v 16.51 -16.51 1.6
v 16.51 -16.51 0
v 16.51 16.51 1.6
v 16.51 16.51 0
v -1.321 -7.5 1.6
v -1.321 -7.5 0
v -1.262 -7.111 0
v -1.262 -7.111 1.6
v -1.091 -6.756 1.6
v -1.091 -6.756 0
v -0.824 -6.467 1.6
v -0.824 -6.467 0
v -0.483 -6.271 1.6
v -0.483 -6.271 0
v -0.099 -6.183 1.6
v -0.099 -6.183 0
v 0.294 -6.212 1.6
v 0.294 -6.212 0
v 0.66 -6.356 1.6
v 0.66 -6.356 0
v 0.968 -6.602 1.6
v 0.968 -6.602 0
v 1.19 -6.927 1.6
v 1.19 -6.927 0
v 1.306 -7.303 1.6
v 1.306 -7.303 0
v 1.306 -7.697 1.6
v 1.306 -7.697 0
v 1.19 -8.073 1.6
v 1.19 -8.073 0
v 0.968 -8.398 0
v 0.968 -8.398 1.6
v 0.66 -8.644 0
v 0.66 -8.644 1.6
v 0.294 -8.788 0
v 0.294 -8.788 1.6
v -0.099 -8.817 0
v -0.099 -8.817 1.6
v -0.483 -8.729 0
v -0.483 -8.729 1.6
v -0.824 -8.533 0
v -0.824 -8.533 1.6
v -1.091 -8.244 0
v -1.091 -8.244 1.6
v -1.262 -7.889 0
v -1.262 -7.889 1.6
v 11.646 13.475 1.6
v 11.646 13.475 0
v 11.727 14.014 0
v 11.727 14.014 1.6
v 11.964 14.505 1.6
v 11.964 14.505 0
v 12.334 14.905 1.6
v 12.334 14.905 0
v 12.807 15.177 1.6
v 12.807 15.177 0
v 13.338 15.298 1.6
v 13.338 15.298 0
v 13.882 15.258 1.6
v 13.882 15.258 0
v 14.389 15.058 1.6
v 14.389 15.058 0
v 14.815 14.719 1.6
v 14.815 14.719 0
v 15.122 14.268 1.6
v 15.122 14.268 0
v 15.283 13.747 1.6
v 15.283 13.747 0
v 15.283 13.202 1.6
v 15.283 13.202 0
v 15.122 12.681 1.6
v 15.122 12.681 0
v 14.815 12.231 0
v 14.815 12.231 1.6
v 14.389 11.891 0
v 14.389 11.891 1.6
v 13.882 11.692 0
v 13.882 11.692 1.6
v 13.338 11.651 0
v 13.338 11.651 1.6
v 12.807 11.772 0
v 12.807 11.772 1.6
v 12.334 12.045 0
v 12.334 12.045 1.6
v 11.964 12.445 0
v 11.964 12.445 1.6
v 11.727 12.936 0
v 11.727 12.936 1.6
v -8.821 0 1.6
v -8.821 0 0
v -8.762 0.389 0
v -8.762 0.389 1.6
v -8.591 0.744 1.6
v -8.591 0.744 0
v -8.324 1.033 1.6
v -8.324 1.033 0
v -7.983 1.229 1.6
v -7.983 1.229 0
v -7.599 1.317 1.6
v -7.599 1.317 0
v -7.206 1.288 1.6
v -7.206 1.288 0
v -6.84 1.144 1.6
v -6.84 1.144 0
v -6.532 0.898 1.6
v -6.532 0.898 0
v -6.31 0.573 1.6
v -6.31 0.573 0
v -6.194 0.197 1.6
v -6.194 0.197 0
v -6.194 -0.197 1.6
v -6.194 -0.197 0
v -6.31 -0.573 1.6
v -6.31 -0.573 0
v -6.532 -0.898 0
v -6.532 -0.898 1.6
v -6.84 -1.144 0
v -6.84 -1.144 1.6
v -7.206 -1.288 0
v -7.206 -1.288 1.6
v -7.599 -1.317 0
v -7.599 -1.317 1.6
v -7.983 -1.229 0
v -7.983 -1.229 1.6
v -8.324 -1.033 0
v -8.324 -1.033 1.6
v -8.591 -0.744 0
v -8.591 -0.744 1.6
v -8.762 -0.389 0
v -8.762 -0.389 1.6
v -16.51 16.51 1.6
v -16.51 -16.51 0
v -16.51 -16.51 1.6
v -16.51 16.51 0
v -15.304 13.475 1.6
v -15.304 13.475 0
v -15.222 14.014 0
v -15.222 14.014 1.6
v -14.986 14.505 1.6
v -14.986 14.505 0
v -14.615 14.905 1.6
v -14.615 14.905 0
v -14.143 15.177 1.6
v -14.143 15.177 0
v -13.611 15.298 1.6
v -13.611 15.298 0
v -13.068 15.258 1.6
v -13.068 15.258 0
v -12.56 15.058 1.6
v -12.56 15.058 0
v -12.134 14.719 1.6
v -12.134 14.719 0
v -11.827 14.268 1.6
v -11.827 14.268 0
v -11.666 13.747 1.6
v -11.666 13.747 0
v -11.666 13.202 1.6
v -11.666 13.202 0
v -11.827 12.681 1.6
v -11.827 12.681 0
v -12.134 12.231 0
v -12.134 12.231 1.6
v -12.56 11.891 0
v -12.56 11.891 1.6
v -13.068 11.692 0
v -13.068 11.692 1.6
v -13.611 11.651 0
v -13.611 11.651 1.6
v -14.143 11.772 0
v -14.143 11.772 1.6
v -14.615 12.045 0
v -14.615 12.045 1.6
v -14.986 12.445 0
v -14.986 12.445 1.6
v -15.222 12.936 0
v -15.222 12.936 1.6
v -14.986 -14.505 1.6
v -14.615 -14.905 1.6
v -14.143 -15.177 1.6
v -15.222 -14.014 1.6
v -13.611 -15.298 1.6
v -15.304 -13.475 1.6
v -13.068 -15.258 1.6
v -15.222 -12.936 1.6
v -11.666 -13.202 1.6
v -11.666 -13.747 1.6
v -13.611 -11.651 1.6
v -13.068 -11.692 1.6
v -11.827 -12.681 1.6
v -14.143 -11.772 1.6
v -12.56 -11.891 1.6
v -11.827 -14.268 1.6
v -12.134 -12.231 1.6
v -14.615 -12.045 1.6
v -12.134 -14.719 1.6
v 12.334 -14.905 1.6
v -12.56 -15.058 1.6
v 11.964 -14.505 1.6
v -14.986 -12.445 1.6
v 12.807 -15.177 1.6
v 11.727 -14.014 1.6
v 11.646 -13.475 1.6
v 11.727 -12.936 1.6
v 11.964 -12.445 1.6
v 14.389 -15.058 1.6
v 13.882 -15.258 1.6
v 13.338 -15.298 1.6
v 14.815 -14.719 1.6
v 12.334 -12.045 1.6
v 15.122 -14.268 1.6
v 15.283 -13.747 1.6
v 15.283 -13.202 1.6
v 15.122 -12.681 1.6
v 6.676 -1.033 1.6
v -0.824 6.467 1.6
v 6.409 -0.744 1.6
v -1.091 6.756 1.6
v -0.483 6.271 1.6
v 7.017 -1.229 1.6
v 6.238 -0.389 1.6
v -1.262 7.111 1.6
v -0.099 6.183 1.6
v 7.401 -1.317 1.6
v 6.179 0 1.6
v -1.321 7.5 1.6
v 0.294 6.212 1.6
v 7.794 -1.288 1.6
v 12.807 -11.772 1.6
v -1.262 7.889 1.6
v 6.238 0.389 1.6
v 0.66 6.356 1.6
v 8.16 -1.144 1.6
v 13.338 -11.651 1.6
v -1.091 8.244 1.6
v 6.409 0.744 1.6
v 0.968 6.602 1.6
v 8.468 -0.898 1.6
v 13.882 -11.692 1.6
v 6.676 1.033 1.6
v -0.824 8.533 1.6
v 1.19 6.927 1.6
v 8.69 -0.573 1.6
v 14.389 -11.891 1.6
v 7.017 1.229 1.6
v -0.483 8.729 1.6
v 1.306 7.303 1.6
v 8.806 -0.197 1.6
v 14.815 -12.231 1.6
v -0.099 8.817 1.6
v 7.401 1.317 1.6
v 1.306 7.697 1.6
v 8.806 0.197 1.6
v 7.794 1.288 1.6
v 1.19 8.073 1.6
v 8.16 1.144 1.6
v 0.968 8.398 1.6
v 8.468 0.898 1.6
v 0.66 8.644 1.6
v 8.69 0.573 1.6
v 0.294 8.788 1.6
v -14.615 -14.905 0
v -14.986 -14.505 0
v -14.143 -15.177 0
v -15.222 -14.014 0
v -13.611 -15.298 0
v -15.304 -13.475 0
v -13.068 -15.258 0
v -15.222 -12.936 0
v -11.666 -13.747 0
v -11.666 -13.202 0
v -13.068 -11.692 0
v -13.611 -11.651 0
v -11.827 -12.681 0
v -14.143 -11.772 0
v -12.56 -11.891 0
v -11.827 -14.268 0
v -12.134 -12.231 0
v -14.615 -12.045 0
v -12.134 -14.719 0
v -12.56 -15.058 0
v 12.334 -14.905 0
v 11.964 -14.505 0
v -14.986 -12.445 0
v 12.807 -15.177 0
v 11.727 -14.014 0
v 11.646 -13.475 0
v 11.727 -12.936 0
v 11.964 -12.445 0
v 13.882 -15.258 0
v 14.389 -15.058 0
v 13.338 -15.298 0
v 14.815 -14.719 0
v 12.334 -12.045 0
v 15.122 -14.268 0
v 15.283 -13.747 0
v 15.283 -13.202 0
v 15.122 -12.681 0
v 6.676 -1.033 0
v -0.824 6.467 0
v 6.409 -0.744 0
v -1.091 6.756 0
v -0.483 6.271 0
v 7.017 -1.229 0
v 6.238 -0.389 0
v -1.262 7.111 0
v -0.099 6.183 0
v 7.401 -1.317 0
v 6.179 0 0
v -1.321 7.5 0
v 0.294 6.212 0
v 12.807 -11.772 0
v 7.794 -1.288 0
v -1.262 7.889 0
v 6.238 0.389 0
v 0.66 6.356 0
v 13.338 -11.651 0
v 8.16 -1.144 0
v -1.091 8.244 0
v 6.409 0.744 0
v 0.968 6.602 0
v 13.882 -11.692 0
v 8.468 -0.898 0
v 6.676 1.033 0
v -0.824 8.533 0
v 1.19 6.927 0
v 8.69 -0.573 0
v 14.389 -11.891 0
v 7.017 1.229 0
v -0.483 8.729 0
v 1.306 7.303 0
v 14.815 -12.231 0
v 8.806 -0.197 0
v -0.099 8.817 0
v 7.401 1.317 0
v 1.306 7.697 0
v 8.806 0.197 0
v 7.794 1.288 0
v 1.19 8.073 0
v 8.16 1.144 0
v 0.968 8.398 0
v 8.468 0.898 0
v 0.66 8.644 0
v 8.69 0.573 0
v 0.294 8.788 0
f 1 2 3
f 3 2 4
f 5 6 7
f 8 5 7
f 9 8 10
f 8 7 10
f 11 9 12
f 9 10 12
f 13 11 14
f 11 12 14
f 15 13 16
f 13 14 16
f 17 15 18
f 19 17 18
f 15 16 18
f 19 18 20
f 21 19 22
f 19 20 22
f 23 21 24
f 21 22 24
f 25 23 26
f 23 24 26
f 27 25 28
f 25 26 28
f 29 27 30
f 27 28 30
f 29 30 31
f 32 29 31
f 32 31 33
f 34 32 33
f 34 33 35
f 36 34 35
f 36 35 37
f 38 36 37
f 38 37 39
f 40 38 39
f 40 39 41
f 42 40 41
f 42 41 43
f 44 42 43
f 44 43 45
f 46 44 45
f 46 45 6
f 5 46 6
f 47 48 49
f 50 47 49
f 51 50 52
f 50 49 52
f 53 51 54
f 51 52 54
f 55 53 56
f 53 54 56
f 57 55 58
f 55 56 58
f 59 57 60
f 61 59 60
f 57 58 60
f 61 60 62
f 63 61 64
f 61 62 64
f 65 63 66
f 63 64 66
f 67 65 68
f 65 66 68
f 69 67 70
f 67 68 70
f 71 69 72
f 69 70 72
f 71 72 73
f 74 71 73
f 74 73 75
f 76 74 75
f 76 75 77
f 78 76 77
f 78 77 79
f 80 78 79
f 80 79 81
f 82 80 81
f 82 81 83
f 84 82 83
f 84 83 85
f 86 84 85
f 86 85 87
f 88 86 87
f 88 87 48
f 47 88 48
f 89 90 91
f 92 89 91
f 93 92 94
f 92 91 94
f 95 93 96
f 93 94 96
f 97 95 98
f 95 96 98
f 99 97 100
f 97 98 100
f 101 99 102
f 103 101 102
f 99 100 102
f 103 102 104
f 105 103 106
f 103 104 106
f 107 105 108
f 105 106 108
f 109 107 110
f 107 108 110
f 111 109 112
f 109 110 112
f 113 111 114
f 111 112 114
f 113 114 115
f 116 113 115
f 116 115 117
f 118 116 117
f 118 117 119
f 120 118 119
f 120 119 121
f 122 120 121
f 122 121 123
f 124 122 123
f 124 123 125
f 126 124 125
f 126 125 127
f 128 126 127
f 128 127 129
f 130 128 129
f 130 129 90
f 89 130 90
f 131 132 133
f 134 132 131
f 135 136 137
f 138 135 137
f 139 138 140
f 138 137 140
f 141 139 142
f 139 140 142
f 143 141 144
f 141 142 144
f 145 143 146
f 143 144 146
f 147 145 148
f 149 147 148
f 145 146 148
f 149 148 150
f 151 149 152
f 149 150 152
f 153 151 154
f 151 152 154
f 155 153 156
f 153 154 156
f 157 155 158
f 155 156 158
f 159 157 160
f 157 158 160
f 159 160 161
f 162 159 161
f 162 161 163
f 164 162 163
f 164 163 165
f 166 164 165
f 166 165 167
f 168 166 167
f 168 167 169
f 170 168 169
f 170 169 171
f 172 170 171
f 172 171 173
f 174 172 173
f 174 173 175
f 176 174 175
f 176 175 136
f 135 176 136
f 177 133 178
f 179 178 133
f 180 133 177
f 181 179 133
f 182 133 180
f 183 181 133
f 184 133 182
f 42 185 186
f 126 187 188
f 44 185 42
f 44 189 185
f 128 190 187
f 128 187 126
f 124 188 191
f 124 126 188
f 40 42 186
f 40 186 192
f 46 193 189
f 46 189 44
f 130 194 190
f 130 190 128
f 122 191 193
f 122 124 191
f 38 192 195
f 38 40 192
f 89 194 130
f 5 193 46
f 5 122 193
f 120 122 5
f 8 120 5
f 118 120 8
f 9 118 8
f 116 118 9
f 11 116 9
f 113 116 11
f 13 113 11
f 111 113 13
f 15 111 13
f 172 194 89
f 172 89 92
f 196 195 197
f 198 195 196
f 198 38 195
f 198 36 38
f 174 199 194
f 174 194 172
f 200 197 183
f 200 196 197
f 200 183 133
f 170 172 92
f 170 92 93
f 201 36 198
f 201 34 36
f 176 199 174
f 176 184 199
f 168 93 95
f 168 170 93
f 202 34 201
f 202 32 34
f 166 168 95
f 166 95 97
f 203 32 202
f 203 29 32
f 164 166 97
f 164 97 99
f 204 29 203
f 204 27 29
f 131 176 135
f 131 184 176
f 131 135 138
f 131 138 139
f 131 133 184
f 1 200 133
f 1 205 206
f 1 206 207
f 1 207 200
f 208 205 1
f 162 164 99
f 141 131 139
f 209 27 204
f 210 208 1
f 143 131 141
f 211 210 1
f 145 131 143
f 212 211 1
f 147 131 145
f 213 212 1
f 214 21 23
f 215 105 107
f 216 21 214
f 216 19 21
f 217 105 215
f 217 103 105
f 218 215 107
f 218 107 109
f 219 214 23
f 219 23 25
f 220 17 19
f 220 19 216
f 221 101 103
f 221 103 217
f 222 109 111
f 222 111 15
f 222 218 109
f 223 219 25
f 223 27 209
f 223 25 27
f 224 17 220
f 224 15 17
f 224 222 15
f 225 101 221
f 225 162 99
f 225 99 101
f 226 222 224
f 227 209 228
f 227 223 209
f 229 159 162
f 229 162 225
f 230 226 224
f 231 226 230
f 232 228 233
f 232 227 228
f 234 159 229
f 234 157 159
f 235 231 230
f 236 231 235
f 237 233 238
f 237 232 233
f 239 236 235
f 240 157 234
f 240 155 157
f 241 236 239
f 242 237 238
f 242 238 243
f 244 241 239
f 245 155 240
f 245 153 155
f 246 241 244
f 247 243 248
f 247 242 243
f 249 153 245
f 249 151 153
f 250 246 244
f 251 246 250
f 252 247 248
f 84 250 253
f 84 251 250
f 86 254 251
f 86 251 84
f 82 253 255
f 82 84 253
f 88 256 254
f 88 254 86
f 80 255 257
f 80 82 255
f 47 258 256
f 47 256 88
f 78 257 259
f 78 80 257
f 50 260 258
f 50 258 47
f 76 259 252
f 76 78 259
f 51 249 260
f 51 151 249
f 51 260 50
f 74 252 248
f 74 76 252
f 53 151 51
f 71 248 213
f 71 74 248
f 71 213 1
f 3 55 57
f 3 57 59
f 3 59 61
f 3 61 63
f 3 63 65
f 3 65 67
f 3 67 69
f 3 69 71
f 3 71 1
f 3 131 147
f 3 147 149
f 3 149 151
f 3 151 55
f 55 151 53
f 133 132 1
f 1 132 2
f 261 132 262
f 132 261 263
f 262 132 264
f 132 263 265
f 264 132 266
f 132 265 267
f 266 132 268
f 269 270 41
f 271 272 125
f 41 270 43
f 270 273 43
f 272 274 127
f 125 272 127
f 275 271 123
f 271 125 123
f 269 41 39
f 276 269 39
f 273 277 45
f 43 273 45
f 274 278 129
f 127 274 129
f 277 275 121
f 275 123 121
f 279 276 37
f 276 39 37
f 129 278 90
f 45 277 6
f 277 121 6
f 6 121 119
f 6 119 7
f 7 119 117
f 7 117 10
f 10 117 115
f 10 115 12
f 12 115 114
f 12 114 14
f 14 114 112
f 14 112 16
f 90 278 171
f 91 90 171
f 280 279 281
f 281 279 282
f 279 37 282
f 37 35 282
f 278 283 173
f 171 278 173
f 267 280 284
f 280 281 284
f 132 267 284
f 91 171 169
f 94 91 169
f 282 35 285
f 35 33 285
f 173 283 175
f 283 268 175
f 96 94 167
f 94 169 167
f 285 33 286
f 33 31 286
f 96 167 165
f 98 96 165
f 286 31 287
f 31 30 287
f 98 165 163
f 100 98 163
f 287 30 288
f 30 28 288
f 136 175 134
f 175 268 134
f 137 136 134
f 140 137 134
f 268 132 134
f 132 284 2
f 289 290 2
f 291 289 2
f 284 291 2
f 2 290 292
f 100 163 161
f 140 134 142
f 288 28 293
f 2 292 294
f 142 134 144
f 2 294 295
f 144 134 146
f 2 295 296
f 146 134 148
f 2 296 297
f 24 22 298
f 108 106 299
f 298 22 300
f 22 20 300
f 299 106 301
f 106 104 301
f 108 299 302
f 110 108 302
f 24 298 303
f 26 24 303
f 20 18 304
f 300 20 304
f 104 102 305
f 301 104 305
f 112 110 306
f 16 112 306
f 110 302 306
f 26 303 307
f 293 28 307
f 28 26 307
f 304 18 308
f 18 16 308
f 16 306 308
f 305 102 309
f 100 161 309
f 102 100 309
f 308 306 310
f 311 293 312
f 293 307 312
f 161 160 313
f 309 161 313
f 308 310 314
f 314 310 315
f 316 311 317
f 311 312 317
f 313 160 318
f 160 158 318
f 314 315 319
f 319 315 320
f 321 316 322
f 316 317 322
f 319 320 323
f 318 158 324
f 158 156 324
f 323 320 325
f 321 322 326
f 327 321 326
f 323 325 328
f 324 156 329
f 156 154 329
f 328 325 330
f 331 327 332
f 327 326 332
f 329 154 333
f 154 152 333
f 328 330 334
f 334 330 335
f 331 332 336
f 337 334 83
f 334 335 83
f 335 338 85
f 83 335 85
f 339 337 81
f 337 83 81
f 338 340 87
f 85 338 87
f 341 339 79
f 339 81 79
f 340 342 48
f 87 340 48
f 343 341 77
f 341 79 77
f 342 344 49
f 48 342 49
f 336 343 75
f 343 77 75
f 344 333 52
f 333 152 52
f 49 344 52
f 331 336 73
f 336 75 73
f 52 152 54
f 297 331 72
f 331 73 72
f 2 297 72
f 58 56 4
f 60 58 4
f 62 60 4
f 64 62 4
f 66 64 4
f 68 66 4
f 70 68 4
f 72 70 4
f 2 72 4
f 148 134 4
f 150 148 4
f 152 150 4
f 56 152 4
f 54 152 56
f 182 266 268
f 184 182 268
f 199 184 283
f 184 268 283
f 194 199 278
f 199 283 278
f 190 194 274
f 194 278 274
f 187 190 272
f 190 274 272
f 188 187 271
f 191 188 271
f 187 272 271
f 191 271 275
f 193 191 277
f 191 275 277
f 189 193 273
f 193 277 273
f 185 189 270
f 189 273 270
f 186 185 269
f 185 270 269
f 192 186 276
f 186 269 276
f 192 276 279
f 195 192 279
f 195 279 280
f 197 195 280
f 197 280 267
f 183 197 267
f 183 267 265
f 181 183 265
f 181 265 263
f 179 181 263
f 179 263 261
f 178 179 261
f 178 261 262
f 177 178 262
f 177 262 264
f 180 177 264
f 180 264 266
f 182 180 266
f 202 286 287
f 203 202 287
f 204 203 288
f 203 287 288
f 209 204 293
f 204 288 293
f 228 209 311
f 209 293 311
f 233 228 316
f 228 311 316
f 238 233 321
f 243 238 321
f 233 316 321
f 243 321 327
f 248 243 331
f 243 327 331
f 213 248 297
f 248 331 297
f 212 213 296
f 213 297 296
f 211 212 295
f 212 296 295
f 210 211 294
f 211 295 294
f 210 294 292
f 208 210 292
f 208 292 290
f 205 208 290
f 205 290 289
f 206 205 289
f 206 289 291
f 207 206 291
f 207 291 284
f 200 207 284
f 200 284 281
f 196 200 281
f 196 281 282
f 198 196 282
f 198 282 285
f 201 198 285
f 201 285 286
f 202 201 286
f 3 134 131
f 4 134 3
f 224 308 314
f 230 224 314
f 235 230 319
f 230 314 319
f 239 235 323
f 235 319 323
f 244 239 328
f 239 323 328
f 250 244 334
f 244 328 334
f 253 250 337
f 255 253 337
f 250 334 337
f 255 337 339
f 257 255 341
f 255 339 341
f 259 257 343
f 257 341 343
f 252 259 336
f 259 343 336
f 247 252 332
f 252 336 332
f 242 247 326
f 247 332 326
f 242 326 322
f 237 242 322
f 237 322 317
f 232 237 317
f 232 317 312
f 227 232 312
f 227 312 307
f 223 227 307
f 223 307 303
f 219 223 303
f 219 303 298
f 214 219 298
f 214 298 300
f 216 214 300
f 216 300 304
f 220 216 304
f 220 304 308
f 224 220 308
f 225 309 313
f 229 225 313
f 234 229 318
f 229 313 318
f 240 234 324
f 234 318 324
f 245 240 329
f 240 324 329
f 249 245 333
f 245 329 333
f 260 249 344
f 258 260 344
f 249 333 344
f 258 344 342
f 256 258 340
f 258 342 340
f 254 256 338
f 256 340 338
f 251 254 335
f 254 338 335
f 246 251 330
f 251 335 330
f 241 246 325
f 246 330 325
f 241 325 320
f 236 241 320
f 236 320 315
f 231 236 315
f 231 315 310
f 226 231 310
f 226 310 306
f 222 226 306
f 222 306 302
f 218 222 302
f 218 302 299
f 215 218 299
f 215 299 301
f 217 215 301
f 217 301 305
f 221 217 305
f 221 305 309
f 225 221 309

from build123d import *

# Parameters (mm, degrees)
SKETCH1_W                   = 33.02
SKETCH1_H                   = 33.02
BOSS_EXTRUDE1_DEPTH         = 1.6002
F_27_0_144_DIAMETER_HOLE1_D = 3.6576
F_37_0_104_DIAMETER_HOLE1_D = 2.6416


with BuildPart() as part:
    # Sketch1 → Boss-Extrude1 (new body)
    with BuildSketch(Plane.XY):
        Rectangle(SKETCH1_W, SKETCH1_H)
    extrude(amount=BOSS_EXTRUDE1_DEPTH)

    # #27 (0.144) Diameter Hole1 (through all)
    with Locations(Plane.XY.offset(1.6002)):
        with Locations((-13.4747, 13.4747), (13.4747, 13.4747), (13.4747, -13.4747), (-13.4747, -13.4747)):
            Hole(F_27_0_144_DIAMETER_HOLE1_D / 2)

    # #37 (0.104) Diameter Hole1 (through all)
    with Locations(Plane.XY.offset(1.6002)):
        with Locations((0, 7.5), (7.5, 0), (0, -7.5), (-7.5, 0)):
            Hole(F_37_0_104_DIAMETER_HOLE1_D / 2)


solid = part.part
